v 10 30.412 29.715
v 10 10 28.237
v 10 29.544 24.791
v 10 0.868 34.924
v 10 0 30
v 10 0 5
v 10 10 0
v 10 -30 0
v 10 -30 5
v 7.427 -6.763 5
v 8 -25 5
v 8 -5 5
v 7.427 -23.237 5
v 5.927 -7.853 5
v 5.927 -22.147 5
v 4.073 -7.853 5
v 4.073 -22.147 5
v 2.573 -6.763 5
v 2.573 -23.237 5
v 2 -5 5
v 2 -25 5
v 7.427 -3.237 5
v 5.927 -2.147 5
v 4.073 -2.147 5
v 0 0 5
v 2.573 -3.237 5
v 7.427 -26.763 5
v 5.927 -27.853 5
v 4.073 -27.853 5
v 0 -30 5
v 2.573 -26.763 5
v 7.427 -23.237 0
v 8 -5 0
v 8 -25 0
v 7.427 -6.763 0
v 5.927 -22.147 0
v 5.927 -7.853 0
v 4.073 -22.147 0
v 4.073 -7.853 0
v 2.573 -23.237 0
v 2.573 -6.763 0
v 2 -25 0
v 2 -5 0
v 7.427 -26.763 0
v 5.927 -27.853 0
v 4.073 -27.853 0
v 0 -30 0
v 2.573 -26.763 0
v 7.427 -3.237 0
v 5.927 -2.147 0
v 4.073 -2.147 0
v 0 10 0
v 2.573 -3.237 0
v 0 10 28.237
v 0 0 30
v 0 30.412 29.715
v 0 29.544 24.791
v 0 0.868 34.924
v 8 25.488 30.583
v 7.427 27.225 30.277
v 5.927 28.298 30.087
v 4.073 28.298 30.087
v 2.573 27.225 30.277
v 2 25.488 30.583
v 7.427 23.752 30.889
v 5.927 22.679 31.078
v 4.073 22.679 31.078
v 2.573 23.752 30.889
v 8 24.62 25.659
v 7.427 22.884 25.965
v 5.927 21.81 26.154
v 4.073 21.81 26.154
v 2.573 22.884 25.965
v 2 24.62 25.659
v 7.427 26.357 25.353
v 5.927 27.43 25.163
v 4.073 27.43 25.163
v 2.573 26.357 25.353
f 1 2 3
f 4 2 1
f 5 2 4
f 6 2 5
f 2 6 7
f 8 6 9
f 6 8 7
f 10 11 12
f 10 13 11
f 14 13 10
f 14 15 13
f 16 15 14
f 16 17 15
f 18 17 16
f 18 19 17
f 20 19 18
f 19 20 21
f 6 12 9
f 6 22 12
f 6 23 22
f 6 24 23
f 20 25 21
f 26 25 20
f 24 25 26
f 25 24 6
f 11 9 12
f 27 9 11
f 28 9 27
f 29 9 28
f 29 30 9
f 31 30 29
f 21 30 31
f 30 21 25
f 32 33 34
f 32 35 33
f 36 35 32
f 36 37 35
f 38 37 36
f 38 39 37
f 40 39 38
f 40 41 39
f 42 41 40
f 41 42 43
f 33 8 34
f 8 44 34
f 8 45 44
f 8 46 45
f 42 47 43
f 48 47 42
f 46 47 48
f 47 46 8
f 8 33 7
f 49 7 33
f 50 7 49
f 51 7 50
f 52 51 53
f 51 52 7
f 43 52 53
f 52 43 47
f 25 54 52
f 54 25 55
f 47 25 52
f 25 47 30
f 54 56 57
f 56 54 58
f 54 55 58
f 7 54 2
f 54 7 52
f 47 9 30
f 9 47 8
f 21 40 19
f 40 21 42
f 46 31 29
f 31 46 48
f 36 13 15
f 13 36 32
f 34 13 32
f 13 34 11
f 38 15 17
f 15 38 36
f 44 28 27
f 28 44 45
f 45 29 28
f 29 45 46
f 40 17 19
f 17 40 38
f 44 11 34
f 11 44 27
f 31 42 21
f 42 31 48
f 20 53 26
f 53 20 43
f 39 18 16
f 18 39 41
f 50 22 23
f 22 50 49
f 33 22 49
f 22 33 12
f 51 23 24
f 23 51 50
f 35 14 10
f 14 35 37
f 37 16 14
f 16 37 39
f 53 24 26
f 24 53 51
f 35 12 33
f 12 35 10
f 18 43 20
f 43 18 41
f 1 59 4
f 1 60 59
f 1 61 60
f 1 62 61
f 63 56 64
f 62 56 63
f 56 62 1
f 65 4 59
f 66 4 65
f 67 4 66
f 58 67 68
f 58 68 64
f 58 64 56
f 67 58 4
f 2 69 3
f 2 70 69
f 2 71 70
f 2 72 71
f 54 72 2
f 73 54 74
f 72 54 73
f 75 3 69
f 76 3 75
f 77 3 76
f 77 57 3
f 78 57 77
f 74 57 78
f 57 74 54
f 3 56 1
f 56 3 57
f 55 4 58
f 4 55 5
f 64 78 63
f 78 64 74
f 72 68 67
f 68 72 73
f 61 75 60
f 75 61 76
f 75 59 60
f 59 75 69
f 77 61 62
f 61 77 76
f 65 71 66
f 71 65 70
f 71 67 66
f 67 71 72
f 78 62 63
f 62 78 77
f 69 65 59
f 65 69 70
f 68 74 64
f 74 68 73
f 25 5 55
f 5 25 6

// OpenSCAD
// skrewz@20180225

difference()
{
  union()
  {
    translate([0,-30,0])
        difference()
        {
          cube([10,40,5]);
          translate([5,5,-0.01])
            cylinder(r=3,h=30);
          translate([5,25,-0.01])
            cylinder(r=3,h=30);
        }

    cube([10,10,30]);

    translate([0,0,30])
      rotate([-10,0,0])
      {
        difference()
        {
          cube([10,30,5]);
          translate([5,25,-0.01])
          cylinder(r=3,h=30);
        }
      }
  }
  union()
  {
  }
}


// vim: ft=openscad fdm=marker fml=1 cindent
